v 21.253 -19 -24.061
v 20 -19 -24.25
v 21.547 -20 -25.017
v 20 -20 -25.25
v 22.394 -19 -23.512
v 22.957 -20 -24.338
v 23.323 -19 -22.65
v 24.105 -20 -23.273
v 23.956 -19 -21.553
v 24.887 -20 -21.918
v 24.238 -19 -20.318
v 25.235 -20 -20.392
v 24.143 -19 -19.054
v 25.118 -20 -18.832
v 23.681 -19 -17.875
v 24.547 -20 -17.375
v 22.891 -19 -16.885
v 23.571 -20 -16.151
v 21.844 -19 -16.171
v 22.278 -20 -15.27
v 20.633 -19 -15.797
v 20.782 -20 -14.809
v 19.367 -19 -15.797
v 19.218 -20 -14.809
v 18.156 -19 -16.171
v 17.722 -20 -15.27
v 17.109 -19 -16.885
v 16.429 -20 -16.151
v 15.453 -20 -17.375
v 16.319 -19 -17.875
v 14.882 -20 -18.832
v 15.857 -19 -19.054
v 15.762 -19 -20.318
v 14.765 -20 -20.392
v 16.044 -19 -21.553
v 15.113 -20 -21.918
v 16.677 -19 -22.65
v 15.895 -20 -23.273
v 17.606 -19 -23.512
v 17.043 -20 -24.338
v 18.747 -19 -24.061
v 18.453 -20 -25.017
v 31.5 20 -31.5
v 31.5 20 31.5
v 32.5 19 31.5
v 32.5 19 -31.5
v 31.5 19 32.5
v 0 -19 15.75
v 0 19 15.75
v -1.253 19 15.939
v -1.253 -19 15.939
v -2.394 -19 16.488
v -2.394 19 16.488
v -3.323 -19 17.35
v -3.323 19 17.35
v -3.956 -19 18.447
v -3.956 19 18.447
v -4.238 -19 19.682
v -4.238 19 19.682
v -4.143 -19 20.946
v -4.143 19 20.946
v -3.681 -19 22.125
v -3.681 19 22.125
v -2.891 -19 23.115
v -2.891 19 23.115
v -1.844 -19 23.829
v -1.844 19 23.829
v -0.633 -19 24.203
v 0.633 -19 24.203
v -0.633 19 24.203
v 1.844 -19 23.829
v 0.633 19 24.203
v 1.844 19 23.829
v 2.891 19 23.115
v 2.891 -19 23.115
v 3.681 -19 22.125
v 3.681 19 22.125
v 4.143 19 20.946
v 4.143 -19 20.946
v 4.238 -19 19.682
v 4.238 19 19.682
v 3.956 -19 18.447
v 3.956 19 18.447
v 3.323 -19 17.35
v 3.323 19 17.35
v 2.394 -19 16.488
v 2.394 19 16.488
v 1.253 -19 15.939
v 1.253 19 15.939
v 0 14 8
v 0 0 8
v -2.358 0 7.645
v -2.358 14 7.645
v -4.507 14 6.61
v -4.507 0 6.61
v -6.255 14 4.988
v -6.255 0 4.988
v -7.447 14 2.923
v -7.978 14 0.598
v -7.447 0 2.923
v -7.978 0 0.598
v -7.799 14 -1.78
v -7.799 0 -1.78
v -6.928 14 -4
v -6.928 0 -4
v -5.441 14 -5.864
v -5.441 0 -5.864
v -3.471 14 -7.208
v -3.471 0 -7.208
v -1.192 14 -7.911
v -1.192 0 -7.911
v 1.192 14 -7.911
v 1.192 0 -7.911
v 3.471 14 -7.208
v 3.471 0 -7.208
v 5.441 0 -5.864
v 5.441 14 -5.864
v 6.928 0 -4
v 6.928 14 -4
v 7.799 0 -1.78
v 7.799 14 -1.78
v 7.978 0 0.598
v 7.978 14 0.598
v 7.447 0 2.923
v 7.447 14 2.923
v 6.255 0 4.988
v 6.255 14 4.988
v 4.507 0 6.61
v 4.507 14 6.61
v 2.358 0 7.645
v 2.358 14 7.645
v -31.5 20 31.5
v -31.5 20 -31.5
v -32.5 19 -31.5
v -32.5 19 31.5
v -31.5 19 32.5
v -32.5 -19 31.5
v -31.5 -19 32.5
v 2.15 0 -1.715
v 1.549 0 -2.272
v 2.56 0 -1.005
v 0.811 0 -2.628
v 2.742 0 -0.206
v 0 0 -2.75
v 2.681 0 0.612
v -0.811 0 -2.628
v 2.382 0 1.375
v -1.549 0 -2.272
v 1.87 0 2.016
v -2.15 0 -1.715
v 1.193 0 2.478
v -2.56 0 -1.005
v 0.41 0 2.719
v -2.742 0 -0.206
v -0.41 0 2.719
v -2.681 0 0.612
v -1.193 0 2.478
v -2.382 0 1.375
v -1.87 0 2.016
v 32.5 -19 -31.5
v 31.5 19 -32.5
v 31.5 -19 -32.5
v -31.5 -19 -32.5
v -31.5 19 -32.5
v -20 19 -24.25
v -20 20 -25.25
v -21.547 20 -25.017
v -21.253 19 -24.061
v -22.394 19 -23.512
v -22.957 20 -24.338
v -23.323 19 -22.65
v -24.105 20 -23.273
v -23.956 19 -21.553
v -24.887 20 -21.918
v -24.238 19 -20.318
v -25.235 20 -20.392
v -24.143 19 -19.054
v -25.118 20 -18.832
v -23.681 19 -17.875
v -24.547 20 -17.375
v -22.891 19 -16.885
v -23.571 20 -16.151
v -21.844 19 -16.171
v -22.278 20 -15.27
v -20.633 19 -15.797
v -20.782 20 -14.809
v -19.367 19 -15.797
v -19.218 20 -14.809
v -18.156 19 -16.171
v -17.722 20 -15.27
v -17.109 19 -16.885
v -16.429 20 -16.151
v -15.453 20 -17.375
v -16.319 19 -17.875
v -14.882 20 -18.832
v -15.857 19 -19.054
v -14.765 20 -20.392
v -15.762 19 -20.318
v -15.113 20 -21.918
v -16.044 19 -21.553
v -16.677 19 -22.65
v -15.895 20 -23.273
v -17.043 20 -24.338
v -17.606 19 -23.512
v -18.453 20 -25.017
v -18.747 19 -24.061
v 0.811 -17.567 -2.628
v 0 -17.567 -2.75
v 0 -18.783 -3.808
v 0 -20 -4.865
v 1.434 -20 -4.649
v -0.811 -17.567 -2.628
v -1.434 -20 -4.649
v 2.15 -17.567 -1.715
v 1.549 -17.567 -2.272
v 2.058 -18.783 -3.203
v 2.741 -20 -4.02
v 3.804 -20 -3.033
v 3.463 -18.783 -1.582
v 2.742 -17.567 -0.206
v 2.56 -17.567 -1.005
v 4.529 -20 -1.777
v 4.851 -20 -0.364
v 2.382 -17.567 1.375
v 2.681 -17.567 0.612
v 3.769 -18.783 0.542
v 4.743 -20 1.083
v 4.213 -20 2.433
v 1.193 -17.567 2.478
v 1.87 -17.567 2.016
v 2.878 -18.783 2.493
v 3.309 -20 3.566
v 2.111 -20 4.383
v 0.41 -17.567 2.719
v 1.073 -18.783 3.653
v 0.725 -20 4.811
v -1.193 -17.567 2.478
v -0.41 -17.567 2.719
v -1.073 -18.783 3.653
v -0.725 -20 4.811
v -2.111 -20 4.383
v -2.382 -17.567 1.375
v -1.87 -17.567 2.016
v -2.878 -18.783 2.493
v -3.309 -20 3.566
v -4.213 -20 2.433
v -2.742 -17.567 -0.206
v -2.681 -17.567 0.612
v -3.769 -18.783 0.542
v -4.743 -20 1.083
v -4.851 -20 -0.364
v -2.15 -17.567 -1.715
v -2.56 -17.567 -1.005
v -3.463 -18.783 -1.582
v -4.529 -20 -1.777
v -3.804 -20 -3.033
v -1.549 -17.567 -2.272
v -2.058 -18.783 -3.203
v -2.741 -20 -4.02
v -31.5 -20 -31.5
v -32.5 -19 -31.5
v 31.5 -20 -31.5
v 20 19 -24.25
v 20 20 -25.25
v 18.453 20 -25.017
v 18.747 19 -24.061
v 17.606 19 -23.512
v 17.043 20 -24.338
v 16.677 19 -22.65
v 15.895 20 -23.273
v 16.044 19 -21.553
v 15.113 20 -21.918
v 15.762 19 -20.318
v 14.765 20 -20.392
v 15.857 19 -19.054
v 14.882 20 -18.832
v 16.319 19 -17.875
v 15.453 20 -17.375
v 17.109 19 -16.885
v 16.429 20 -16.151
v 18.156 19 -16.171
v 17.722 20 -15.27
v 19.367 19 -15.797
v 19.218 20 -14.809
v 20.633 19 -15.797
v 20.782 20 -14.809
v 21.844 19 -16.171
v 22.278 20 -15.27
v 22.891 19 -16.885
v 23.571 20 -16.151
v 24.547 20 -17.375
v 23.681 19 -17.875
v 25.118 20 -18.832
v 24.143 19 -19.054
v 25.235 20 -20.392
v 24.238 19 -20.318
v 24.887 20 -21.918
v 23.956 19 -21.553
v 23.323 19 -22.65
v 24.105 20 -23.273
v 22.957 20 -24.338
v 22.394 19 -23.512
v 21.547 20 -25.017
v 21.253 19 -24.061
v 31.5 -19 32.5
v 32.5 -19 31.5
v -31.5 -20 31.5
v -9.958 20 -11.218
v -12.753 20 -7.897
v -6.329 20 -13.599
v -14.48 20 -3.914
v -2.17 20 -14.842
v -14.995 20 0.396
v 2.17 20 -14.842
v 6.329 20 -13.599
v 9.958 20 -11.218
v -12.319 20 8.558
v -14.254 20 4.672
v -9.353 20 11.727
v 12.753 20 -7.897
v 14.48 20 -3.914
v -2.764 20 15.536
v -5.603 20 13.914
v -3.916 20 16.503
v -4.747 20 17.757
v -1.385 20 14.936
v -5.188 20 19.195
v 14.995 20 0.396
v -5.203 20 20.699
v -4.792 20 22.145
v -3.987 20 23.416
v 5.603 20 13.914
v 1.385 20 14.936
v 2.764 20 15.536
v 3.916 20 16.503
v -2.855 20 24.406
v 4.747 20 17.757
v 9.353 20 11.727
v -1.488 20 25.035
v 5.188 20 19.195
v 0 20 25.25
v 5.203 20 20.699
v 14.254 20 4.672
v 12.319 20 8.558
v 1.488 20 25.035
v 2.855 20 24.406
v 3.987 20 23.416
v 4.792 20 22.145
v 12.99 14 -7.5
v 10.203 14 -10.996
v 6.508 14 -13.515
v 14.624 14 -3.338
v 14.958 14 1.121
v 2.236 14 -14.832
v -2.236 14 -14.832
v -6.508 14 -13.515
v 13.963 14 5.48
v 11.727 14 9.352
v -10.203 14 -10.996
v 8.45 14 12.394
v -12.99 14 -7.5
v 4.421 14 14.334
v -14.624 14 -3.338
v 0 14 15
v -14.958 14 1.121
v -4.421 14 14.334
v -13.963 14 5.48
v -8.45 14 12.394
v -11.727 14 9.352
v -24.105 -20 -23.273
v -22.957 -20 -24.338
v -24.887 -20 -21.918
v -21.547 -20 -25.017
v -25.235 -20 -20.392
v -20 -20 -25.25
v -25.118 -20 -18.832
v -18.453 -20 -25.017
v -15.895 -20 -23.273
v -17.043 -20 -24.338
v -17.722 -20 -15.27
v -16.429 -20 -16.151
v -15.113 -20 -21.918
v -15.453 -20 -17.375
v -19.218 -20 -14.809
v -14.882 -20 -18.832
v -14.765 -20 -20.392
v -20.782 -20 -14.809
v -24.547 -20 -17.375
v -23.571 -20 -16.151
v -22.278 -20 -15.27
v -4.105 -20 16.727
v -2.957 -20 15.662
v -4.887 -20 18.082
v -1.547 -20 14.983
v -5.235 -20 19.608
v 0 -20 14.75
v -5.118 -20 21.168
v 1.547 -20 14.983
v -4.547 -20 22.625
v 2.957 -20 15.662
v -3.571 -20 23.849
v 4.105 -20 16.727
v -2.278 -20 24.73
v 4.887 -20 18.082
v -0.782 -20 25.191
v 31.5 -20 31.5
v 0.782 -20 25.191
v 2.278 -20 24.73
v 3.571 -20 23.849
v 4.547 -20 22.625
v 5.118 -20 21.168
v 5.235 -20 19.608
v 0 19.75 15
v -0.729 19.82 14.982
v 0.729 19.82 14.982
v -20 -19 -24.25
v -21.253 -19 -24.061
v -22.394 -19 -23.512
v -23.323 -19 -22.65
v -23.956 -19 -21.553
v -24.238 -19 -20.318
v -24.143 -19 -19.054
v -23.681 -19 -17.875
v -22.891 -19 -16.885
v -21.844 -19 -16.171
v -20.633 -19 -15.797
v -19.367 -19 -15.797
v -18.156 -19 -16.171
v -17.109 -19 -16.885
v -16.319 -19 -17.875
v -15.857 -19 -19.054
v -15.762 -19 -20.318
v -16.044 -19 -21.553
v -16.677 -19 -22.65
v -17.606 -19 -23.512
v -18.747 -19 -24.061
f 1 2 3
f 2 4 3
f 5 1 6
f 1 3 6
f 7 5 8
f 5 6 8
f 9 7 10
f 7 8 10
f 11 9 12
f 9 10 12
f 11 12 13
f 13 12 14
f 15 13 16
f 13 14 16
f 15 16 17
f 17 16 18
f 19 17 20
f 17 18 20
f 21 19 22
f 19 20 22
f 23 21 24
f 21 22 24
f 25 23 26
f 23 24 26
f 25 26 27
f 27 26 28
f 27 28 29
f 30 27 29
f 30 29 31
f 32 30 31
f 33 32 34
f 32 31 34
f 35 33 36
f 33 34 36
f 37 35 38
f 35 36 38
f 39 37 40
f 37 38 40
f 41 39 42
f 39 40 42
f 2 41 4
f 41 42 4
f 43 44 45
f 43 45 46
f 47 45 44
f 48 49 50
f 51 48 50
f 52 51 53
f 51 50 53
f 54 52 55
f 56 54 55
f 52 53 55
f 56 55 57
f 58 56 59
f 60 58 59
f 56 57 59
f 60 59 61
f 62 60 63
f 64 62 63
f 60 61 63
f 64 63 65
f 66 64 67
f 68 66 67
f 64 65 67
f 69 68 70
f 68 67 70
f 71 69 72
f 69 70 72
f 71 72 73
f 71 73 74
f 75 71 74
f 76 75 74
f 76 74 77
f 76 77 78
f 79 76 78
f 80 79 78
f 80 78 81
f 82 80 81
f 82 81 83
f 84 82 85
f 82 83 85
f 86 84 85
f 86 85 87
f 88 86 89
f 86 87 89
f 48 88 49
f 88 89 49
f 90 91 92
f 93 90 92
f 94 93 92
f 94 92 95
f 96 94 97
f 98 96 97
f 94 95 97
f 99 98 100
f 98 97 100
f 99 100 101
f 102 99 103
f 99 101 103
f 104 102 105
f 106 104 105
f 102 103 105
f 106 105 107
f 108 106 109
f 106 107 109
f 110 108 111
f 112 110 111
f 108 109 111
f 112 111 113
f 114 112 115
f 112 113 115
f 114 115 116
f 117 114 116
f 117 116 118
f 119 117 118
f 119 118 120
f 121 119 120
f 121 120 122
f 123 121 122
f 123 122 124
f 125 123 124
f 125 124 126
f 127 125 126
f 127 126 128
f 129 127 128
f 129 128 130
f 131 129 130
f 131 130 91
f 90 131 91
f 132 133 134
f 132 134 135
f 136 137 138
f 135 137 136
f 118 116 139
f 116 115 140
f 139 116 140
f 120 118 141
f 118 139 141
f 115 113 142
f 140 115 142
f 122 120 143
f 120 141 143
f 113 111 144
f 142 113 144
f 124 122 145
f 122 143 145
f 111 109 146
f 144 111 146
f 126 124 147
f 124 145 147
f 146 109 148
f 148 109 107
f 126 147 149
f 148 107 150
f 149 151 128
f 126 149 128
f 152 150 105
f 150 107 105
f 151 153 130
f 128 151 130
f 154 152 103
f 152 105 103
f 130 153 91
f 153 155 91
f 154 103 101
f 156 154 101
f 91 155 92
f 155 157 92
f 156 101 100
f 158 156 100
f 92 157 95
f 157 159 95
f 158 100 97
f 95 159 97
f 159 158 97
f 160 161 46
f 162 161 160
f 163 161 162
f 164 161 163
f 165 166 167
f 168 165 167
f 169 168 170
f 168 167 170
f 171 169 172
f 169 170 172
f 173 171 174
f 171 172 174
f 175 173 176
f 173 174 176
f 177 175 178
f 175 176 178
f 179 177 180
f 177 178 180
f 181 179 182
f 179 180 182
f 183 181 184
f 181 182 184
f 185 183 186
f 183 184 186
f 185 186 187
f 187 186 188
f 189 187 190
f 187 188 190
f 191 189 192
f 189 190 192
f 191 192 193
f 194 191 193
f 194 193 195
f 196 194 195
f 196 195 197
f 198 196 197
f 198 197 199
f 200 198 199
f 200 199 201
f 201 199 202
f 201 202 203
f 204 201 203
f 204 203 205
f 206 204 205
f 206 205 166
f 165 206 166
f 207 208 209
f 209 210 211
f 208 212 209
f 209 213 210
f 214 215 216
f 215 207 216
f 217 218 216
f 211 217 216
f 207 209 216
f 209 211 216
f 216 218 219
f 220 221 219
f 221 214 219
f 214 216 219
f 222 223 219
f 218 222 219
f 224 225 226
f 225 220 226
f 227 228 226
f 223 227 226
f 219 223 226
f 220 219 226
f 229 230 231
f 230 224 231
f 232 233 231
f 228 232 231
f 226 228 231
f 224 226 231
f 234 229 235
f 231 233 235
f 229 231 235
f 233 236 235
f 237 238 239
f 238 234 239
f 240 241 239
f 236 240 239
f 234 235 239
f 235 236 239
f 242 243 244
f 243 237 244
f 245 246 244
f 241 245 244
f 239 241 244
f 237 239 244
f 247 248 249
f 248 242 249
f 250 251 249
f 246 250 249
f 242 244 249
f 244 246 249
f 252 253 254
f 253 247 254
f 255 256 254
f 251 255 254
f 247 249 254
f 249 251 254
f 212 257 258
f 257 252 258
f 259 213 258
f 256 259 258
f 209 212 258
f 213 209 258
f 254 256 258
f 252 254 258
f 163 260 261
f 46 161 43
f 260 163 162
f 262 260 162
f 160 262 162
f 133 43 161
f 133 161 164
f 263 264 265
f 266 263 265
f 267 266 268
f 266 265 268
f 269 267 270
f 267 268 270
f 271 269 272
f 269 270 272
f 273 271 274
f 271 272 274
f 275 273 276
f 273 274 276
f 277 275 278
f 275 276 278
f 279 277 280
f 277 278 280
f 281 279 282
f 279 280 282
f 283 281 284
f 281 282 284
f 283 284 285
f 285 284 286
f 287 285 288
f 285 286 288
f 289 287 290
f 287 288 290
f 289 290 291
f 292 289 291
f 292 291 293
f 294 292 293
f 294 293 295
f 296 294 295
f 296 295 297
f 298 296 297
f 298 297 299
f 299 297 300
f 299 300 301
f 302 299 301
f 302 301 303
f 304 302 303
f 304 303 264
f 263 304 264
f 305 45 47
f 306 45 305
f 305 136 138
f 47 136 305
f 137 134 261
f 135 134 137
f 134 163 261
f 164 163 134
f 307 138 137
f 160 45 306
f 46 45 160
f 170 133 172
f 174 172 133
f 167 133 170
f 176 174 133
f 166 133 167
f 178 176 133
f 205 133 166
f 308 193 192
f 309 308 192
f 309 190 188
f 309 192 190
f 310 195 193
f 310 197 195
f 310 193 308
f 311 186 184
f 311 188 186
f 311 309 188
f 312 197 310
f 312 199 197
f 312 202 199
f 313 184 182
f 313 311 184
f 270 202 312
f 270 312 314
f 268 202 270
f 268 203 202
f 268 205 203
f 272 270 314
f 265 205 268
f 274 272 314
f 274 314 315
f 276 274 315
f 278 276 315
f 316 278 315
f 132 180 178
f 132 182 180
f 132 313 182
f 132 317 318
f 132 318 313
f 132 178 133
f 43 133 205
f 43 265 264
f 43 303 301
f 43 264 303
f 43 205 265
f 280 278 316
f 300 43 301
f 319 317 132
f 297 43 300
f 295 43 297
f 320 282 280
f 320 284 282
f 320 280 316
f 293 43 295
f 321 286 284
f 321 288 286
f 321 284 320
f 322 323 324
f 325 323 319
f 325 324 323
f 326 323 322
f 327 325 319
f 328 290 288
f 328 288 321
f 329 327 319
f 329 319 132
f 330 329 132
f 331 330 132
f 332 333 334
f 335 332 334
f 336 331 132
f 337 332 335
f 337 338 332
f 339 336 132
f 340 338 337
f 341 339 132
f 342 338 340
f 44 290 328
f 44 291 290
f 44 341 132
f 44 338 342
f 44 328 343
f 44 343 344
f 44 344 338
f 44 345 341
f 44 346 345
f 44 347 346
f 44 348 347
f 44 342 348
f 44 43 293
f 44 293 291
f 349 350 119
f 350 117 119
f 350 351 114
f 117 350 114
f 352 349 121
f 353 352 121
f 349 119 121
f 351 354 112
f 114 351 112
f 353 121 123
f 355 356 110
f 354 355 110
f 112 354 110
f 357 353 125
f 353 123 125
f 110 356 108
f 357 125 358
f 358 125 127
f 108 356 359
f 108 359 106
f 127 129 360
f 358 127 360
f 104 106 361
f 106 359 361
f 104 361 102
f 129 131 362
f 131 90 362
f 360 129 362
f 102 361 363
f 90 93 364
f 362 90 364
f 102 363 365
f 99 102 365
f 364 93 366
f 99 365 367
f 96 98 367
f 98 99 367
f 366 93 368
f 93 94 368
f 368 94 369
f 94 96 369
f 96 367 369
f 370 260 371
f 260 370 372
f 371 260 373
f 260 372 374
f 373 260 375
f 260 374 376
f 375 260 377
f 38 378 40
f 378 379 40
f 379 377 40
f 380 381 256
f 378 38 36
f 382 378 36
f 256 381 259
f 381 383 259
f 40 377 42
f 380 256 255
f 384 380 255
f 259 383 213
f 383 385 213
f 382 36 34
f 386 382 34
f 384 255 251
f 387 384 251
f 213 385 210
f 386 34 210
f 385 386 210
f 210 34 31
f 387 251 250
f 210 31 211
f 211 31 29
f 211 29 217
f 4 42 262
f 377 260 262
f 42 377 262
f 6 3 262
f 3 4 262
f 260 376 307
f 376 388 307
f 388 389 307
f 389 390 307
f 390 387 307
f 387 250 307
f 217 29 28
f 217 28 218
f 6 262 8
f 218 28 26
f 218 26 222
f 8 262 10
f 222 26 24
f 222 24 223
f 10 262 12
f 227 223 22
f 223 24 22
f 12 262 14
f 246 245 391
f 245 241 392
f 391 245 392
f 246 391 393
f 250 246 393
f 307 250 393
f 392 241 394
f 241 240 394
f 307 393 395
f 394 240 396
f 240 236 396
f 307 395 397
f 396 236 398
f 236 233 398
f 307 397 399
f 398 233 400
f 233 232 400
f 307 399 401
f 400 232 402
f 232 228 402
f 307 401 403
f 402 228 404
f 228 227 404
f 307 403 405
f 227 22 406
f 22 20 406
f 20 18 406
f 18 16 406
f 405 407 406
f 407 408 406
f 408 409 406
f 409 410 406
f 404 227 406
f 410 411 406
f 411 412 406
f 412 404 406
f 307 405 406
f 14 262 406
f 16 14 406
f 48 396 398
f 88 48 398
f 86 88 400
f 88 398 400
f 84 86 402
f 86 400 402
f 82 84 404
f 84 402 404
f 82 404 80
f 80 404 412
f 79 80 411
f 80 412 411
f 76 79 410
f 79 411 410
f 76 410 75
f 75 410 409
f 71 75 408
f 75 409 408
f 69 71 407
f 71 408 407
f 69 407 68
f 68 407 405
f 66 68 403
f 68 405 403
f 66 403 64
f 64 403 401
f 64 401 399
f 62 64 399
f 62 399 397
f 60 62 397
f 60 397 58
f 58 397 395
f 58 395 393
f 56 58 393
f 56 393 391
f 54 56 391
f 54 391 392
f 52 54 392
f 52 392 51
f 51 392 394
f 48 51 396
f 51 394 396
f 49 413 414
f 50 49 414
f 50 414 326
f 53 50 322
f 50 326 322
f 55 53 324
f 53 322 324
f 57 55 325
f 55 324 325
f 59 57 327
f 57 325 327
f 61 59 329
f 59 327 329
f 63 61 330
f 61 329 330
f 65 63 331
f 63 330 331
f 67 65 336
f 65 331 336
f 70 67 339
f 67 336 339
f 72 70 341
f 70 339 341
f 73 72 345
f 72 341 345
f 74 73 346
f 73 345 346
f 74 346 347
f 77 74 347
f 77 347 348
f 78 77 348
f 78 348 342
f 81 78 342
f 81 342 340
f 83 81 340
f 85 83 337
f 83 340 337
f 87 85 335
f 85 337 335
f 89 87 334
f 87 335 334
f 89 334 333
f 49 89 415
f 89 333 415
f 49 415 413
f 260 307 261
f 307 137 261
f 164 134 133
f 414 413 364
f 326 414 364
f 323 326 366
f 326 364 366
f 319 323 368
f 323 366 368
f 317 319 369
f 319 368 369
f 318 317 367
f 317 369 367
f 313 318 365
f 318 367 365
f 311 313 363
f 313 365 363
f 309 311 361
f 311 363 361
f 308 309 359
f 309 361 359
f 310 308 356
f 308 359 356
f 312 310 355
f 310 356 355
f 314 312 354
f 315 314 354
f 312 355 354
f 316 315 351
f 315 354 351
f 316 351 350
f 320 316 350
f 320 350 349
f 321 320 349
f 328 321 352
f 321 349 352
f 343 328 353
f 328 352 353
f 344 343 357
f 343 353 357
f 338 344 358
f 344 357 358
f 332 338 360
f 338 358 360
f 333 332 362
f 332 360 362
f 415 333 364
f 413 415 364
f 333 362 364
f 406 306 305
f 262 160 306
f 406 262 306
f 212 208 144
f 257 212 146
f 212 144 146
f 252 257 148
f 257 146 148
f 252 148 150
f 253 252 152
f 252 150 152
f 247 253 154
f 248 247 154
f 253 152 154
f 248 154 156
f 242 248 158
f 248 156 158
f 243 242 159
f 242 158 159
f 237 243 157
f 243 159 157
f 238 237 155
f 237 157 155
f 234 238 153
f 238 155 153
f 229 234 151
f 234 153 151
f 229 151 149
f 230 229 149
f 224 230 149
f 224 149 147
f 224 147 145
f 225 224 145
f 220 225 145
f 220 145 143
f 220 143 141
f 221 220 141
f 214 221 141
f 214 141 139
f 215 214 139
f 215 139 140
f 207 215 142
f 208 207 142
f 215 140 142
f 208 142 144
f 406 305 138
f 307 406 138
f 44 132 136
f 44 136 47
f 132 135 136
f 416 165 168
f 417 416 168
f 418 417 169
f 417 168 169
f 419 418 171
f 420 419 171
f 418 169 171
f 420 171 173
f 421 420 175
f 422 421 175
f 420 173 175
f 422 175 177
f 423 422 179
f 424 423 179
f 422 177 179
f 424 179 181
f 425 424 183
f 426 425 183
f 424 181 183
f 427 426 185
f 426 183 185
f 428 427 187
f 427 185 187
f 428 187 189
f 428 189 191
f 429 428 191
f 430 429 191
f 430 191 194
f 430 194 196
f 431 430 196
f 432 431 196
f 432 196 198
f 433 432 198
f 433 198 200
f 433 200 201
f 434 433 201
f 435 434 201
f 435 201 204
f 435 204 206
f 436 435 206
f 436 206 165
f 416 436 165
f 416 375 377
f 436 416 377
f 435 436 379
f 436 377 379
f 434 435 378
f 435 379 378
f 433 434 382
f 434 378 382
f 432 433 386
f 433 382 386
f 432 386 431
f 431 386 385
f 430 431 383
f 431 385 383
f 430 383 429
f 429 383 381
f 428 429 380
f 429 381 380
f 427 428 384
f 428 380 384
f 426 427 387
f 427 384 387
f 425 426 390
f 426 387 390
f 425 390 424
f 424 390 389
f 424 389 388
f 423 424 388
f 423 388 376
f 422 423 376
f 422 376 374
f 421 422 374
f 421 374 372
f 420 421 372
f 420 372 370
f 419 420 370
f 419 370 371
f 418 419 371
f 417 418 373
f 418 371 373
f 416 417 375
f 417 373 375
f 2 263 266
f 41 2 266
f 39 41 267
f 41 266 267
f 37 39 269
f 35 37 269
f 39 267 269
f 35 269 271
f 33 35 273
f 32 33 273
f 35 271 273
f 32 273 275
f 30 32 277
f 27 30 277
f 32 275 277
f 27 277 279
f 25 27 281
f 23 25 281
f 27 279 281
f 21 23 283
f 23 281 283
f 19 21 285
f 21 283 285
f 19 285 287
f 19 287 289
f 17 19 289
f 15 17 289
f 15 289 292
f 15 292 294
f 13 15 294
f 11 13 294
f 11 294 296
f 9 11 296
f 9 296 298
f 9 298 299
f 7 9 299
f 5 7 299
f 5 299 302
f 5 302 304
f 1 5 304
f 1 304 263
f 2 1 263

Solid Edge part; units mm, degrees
sketch "Sketch1" plane through (0, 0, 0) normal (0, -1, 0) x (1, 0, 0)
  line L0 (-32.5, 32.5) -> (32.5, 32.5)
  line L1 (32.5, 32.5) -> (32.5, -32.5)
  line L2 (32.5, -32.5) -> (-32.5, -32.5)
  line L3 (-32.5, -32.5) -> (-32.5, 32.5)
  dimension "D1" = 65
  dimension "D2" = 65
extrude "Protrusion1" add sketch "Sketch1" along normal mid plane 40
hole "Bohrung_1" at (-20, -20, -20) direction (0, 1, 0) diameter 8.5 depth 50
hole "Hole1" at (20, -20, -20) direction (0, 1, 0) diameter 8.5 depth 50
hole "Hole2" at (0, -20, 20) direction (0, 1, 0) diameter 8.5 depth 50
hole "Bohrung_4" at (0, 20, 0) direction (0, -1, 0) diameter 16 depth 20
hole "Bohrung_5" at (0, -20, 0) direction (0, 1, 0) diameter 5.5 depth 20 countersink diameter 9.73 countersink angle 82
chamfer "Fase_1" distance 1 angle 45 6 edges at (0, -20, 24.25) (0, 20, 15.75) (-20, -20, -15.75) (-20, 20, -24.25) (20, -20, -15.75) (20, 20, -24.25)
chamfer "Fase_3" distance 1 angle 45 12 edges at (0, -20, -32.5) (32.5, -20, 0) (32.5, 0, -32.5) (32.5, 0, 32.5) (-32.5, 0, 32.5) (0, -20, 32.5) (-32.5, -20, 0) (-32.5, 0, -32.5) (-32.5, 20, 0) (0, 20, -32.5) (32.5, 20, 0) (0, 20, 32.5)
hole "Bohrung_6" at (0, 20, 0) direction (0, -1, 0) diameter 30 depth 6
